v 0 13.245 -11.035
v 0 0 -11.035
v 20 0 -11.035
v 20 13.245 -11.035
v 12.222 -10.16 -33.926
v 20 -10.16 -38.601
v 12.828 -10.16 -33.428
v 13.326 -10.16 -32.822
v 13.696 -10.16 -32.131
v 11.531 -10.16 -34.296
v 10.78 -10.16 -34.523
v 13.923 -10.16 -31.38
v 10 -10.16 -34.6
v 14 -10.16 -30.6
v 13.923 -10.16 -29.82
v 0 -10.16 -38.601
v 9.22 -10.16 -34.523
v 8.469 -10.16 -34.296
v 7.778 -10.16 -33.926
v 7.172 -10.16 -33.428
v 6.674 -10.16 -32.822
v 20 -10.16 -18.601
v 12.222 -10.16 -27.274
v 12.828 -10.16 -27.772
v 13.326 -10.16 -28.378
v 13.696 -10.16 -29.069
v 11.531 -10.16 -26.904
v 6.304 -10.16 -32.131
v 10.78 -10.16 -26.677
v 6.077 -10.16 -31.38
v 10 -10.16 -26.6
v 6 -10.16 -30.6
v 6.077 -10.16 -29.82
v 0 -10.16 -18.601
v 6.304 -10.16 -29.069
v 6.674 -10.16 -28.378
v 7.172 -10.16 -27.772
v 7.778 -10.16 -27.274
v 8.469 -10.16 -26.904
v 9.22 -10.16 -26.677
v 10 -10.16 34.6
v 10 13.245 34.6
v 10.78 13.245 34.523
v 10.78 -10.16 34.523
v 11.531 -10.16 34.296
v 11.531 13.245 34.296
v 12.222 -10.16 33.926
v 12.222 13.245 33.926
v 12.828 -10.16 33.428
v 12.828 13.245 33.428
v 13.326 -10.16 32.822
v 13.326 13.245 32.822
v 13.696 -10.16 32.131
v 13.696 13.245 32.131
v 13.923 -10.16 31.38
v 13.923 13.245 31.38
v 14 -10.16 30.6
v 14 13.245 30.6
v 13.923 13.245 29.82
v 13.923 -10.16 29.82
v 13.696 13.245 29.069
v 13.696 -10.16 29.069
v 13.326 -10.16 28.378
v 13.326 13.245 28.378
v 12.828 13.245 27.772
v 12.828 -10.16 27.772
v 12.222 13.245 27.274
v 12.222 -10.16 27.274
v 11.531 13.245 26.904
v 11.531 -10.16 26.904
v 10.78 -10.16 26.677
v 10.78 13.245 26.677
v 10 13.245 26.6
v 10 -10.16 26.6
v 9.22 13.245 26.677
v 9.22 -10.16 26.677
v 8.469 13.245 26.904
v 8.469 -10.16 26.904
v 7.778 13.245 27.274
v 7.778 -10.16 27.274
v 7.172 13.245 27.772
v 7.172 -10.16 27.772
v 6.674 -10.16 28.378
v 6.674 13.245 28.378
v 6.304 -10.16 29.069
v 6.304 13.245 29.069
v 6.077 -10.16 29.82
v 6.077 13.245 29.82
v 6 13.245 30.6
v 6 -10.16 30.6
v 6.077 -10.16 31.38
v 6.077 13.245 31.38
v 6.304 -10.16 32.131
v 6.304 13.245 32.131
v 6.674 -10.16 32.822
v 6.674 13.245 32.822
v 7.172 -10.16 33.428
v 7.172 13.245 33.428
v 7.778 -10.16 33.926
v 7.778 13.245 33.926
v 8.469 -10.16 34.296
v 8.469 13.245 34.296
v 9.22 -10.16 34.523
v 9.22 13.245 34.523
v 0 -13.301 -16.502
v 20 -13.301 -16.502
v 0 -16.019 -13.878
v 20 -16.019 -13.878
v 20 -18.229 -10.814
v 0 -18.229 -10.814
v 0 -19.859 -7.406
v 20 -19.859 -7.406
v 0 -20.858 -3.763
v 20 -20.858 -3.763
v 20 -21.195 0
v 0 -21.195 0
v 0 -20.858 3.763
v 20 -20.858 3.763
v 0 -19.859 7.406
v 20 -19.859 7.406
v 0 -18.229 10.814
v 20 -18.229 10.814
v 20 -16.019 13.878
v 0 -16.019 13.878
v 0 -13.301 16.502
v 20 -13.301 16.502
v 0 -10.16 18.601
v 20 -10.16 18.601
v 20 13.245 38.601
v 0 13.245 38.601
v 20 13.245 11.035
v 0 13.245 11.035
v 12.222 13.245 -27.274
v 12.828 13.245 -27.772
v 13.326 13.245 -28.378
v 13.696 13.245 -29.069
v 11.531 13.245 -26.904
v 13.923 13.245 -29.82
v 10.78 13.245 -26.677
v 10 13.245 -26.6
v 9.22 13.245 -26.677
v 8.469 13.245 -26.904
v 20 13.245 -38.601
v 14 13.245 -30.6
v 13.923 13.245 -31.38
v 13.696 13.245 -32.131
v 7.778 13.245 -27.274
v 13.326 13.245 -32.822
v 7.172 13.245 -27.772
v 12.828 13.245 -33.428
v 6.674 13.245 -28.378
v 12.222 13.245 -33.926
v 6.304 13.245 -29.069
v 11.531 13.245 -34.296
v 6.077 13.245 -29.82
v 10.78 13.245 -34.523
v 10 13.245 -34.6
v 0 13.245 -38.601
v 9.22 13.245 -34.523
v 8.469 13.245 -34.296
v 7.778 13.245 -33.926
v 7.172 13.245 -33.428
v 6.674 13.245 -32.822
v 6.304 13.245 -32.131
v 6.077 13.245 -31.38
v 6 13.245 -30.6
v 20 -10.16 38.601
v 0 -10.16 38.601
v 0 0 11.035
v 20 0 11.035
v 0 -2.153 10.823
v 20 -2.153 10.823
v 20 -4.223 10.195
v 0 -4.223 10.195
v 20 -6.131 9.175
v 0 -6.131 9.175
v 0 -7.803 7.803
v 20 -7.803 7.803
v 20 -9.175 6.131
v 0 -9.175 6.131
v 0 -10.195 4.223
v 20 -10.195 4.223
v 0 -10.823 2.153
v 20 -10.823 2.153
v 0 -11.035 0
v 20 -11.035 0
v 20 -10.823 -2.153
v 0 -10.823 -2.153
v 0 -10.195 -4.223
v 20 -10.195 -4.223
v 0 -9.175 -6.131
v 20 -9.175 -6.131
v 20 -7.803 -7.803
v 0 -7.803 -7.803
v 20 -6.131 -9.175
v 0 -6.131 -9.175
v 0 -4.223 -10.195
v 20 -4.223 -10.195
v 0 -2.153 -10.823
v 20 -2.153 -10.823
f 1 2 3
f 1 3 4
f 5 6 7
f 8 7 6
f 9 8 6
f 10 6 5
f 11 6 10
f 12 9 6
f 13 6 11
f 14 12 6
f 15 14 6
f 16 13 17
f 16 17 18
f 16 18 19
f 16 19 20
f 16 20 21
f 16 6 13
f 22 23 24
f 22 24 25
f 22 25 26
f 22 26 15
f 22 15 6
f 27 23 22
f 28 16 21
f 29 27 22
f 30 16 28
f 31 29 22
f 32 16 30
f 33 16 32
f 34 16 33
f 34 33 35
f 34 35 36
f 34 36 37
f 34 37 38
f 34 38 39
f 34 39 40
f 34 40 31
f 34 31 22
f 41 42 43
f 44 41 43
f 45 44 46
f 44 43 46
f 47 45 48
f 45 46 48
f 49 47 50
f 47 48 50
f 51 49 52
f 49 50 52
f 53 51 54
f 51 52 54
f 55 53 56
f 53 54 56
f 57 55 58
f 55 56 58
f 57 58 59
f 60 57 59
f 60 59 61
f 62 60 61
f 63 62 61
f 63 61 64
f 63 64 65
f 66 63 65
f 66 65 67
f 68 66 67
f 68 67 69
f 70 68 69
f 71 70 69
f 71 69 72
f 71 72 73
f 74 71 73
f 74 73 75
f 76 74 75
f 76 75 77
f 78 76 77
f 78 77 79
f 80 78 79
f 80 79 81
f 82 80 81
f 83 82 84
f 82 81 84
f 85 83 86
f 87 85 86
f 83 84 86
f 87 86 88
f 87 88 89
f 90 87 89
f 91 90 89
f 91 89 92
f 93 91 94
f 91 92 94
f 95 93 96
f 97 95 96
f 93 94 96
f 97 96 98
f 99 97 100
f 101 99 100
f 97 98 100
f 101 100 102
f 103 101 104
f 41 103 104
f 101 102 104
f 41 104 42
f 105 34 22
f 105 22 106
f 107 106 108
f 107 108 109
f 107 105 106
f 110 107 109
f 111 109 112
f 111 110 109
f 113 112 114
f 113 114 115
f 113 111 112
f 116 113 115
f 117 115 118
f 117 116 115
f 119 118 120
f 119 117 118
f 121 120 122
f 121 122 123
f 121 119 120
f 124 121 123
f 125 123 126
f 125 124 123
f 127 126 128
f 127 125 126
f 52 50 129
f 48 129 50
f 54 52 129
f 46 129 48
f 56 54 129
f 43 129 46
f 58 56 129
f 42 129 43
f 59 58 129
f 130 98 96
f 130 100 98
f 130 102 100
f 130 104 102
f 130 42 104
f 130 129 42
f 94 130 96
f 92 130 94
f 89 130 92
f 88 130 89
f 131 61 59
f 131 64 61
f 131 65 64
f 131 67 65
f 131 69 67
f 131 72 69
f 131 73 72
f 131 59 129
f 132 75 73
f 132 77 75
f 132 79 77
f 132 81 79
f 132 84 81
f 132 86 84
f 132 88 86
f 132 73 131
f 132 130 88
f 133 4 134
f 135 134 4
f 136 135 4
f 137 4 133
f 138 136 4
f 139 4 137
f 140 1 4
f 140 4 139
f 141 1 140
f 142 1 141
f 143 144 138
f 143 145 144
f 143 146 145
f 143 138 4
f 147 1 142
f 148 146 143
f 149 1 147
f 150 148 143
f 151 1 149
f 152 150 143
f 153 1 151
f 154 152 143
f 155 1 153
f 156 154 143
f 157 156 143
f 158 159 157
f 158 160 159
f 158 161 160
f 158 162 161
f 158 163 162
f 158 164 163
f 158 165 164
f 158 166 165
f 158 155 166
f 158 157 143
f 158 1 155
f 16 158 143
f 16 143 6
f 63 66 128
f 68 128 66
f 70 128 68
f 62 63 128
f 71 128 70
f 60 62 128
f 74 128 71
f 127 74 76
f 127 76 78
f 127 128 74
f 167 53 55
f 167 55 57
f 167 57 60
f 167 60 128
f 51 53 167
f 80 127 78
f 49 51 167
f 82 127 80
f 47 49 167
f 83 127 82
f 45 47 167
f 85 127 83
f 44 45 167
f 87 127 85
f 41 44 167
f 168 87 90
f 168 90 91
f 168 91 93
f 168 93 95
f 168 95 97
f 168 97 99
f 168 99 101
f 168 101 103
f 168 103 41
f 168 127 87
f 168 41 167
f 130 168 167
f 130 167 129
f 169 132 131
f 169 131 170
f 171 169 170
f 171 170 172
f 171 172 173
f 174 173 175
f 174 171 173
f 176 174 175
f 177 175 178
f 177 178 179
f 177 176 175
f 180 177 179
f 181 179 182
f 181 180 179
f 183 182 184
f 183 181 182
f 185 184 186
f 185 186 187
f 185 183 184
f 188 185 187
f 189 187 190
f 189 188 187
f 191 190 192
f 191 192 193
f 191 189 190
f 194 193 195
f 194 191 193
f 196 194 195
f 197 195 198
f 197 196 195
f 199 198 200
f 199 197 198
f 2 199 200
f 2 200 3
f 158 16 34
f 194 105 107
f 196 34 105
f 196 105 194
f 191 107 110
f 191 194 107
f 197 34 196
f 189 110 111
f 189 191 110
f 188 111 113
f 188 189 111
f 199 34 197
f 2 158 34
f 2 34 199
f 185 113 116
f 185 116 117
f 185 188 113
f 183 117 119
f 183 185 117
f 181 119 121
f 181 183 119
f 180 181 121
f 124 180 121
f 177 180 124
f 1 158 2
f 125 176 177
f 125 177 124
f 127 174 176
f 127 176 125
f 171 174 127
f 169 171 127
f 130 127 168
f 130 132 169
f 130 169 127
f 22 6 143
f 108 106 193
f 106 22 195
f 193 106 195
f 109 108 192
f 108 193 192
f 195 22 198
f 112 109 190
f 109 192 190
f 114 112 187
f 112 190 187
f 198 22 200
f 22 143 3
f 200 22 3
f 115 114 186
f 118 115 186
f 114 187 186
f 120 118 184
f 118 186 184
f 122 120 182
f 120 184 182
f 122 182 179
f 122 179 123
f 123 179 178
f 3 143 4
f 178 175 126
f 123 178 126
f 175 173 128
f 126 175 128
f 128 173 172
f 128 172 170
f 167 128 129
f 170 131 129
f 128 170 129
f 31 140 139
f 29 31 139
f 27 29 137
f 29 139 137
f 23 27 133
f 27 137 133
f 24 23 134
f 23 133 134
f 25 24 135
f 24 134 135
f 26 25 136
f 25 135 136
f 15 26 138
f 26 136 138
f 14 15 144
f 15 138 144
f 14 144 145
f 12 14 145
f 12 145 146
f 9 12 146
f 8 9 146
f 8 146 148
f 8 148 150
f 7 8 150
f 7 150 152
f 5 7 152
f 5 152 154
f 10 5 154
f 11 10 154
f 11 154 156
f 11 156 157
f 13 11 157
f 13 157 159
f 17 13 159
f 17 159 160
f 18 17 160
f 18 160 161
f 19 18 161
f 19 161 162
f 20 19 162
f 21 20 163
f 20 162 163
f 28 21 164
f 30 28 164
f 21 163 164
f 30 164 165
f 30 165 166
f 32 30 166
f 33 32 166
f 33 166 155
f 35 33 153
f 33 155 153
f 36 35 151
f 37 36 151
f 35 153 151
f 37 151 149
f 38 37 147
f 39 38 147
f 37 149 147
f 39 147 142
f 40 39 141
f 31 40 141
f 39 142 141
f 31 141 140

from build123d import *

# Parameters (mm, degrees)
BOSS_EXTRUDE1_DEPTH = 20
CUT_EXTRUDE1_REACH  = 57.463
SKETCH3_R           = 4


with BuildPart() as part:
    # Sketch2 → Boss-Extrude1 (new body)
    with BuildSketch(Plane(origin=(0, 0, 0), x_dir=(0, 0, -1), z_dir=(1, 0, 0))):
        with BuildLine():
            Line((-18.601140422, -10.16), (-38.601140422, -10.16))
            Line((-38.601140422, -10.16), (-38.601140422, 0))
            Line((-38.601140422, 0), (-38.601140422, 13.245))
            Line((-38.601140422, 13.245), (-11.035, 13.245))
            Line((-11.035, 13.245), (-11.035, 0))
            ThreePointArc((-11.035, 0), (0, -11.035), (11.035, 0))
            Line((11.035, 0), (11.035, 13.245))
            Line((11.035, 13.245), (38.601140422, 13.245))
            Line((38.601140422, 13.245), (38.601140422, -10.16))
            Line((38.601140422, -10.16), (18.601140422, -10.16))
            ThreePointArc((18.601140422, -10.16), (0, -21.195), (-18.601140422, -10.16))
        make_face()
    extrude(amount=BOSS_EXTRUDE1_DEPTH)

    # Sketch3 → Cut-Extrude1 (cut, up to next)
    with BuildSketch(Plane(origin=(0, 13.245, 0), x_dir=(1, 0, 0), z_dir=(0, 1, 0)), mode=Mode.PRIVATE) as cut_extrude1_sk1:
        with Locations(Location((10, -30.6, 0), (0, 0, 270))):
            Circle(SKETCH3_R)
    cut_extrude1_tool1 = extrude(cut_extrude1_sk1.sketch, amount=-CUT_EXTRUDE1_REACH, mode=Mode.PRIVATE) & part.part
    # Sketch3 → Cut-Extrude1 (cut, up to next)
    with BuildSketch(Plane(origin=(0, 13.245, 0), x_dir=(1, 0, 0), z_dir=(0, 1, 0)), mode=Mode.PRIVATE) as cut_extrude1_sk2:
        with Locations(Location((10, 30.6, 0), (0, 0, 270))):
            Circle(SKETCH3_R)
    cut_extrude1_tool2 = extrude(cut_extrude1_sk2.sketch, amount=-CUT_EXTRUDE1_REACH, mode=Mode.PRIVATE) & part.part
    add(cut_extrude1_tool1.solids().sort_by_distance((10, 13.245, 30.6))[0], mode=Mode.SUBTRACT)
    add(cut_extrude1_tool2.solids().sort_by_distance((10, 13.245, -30.6))[0], mode=Mode.SUBTRACT)


solid = part.part
